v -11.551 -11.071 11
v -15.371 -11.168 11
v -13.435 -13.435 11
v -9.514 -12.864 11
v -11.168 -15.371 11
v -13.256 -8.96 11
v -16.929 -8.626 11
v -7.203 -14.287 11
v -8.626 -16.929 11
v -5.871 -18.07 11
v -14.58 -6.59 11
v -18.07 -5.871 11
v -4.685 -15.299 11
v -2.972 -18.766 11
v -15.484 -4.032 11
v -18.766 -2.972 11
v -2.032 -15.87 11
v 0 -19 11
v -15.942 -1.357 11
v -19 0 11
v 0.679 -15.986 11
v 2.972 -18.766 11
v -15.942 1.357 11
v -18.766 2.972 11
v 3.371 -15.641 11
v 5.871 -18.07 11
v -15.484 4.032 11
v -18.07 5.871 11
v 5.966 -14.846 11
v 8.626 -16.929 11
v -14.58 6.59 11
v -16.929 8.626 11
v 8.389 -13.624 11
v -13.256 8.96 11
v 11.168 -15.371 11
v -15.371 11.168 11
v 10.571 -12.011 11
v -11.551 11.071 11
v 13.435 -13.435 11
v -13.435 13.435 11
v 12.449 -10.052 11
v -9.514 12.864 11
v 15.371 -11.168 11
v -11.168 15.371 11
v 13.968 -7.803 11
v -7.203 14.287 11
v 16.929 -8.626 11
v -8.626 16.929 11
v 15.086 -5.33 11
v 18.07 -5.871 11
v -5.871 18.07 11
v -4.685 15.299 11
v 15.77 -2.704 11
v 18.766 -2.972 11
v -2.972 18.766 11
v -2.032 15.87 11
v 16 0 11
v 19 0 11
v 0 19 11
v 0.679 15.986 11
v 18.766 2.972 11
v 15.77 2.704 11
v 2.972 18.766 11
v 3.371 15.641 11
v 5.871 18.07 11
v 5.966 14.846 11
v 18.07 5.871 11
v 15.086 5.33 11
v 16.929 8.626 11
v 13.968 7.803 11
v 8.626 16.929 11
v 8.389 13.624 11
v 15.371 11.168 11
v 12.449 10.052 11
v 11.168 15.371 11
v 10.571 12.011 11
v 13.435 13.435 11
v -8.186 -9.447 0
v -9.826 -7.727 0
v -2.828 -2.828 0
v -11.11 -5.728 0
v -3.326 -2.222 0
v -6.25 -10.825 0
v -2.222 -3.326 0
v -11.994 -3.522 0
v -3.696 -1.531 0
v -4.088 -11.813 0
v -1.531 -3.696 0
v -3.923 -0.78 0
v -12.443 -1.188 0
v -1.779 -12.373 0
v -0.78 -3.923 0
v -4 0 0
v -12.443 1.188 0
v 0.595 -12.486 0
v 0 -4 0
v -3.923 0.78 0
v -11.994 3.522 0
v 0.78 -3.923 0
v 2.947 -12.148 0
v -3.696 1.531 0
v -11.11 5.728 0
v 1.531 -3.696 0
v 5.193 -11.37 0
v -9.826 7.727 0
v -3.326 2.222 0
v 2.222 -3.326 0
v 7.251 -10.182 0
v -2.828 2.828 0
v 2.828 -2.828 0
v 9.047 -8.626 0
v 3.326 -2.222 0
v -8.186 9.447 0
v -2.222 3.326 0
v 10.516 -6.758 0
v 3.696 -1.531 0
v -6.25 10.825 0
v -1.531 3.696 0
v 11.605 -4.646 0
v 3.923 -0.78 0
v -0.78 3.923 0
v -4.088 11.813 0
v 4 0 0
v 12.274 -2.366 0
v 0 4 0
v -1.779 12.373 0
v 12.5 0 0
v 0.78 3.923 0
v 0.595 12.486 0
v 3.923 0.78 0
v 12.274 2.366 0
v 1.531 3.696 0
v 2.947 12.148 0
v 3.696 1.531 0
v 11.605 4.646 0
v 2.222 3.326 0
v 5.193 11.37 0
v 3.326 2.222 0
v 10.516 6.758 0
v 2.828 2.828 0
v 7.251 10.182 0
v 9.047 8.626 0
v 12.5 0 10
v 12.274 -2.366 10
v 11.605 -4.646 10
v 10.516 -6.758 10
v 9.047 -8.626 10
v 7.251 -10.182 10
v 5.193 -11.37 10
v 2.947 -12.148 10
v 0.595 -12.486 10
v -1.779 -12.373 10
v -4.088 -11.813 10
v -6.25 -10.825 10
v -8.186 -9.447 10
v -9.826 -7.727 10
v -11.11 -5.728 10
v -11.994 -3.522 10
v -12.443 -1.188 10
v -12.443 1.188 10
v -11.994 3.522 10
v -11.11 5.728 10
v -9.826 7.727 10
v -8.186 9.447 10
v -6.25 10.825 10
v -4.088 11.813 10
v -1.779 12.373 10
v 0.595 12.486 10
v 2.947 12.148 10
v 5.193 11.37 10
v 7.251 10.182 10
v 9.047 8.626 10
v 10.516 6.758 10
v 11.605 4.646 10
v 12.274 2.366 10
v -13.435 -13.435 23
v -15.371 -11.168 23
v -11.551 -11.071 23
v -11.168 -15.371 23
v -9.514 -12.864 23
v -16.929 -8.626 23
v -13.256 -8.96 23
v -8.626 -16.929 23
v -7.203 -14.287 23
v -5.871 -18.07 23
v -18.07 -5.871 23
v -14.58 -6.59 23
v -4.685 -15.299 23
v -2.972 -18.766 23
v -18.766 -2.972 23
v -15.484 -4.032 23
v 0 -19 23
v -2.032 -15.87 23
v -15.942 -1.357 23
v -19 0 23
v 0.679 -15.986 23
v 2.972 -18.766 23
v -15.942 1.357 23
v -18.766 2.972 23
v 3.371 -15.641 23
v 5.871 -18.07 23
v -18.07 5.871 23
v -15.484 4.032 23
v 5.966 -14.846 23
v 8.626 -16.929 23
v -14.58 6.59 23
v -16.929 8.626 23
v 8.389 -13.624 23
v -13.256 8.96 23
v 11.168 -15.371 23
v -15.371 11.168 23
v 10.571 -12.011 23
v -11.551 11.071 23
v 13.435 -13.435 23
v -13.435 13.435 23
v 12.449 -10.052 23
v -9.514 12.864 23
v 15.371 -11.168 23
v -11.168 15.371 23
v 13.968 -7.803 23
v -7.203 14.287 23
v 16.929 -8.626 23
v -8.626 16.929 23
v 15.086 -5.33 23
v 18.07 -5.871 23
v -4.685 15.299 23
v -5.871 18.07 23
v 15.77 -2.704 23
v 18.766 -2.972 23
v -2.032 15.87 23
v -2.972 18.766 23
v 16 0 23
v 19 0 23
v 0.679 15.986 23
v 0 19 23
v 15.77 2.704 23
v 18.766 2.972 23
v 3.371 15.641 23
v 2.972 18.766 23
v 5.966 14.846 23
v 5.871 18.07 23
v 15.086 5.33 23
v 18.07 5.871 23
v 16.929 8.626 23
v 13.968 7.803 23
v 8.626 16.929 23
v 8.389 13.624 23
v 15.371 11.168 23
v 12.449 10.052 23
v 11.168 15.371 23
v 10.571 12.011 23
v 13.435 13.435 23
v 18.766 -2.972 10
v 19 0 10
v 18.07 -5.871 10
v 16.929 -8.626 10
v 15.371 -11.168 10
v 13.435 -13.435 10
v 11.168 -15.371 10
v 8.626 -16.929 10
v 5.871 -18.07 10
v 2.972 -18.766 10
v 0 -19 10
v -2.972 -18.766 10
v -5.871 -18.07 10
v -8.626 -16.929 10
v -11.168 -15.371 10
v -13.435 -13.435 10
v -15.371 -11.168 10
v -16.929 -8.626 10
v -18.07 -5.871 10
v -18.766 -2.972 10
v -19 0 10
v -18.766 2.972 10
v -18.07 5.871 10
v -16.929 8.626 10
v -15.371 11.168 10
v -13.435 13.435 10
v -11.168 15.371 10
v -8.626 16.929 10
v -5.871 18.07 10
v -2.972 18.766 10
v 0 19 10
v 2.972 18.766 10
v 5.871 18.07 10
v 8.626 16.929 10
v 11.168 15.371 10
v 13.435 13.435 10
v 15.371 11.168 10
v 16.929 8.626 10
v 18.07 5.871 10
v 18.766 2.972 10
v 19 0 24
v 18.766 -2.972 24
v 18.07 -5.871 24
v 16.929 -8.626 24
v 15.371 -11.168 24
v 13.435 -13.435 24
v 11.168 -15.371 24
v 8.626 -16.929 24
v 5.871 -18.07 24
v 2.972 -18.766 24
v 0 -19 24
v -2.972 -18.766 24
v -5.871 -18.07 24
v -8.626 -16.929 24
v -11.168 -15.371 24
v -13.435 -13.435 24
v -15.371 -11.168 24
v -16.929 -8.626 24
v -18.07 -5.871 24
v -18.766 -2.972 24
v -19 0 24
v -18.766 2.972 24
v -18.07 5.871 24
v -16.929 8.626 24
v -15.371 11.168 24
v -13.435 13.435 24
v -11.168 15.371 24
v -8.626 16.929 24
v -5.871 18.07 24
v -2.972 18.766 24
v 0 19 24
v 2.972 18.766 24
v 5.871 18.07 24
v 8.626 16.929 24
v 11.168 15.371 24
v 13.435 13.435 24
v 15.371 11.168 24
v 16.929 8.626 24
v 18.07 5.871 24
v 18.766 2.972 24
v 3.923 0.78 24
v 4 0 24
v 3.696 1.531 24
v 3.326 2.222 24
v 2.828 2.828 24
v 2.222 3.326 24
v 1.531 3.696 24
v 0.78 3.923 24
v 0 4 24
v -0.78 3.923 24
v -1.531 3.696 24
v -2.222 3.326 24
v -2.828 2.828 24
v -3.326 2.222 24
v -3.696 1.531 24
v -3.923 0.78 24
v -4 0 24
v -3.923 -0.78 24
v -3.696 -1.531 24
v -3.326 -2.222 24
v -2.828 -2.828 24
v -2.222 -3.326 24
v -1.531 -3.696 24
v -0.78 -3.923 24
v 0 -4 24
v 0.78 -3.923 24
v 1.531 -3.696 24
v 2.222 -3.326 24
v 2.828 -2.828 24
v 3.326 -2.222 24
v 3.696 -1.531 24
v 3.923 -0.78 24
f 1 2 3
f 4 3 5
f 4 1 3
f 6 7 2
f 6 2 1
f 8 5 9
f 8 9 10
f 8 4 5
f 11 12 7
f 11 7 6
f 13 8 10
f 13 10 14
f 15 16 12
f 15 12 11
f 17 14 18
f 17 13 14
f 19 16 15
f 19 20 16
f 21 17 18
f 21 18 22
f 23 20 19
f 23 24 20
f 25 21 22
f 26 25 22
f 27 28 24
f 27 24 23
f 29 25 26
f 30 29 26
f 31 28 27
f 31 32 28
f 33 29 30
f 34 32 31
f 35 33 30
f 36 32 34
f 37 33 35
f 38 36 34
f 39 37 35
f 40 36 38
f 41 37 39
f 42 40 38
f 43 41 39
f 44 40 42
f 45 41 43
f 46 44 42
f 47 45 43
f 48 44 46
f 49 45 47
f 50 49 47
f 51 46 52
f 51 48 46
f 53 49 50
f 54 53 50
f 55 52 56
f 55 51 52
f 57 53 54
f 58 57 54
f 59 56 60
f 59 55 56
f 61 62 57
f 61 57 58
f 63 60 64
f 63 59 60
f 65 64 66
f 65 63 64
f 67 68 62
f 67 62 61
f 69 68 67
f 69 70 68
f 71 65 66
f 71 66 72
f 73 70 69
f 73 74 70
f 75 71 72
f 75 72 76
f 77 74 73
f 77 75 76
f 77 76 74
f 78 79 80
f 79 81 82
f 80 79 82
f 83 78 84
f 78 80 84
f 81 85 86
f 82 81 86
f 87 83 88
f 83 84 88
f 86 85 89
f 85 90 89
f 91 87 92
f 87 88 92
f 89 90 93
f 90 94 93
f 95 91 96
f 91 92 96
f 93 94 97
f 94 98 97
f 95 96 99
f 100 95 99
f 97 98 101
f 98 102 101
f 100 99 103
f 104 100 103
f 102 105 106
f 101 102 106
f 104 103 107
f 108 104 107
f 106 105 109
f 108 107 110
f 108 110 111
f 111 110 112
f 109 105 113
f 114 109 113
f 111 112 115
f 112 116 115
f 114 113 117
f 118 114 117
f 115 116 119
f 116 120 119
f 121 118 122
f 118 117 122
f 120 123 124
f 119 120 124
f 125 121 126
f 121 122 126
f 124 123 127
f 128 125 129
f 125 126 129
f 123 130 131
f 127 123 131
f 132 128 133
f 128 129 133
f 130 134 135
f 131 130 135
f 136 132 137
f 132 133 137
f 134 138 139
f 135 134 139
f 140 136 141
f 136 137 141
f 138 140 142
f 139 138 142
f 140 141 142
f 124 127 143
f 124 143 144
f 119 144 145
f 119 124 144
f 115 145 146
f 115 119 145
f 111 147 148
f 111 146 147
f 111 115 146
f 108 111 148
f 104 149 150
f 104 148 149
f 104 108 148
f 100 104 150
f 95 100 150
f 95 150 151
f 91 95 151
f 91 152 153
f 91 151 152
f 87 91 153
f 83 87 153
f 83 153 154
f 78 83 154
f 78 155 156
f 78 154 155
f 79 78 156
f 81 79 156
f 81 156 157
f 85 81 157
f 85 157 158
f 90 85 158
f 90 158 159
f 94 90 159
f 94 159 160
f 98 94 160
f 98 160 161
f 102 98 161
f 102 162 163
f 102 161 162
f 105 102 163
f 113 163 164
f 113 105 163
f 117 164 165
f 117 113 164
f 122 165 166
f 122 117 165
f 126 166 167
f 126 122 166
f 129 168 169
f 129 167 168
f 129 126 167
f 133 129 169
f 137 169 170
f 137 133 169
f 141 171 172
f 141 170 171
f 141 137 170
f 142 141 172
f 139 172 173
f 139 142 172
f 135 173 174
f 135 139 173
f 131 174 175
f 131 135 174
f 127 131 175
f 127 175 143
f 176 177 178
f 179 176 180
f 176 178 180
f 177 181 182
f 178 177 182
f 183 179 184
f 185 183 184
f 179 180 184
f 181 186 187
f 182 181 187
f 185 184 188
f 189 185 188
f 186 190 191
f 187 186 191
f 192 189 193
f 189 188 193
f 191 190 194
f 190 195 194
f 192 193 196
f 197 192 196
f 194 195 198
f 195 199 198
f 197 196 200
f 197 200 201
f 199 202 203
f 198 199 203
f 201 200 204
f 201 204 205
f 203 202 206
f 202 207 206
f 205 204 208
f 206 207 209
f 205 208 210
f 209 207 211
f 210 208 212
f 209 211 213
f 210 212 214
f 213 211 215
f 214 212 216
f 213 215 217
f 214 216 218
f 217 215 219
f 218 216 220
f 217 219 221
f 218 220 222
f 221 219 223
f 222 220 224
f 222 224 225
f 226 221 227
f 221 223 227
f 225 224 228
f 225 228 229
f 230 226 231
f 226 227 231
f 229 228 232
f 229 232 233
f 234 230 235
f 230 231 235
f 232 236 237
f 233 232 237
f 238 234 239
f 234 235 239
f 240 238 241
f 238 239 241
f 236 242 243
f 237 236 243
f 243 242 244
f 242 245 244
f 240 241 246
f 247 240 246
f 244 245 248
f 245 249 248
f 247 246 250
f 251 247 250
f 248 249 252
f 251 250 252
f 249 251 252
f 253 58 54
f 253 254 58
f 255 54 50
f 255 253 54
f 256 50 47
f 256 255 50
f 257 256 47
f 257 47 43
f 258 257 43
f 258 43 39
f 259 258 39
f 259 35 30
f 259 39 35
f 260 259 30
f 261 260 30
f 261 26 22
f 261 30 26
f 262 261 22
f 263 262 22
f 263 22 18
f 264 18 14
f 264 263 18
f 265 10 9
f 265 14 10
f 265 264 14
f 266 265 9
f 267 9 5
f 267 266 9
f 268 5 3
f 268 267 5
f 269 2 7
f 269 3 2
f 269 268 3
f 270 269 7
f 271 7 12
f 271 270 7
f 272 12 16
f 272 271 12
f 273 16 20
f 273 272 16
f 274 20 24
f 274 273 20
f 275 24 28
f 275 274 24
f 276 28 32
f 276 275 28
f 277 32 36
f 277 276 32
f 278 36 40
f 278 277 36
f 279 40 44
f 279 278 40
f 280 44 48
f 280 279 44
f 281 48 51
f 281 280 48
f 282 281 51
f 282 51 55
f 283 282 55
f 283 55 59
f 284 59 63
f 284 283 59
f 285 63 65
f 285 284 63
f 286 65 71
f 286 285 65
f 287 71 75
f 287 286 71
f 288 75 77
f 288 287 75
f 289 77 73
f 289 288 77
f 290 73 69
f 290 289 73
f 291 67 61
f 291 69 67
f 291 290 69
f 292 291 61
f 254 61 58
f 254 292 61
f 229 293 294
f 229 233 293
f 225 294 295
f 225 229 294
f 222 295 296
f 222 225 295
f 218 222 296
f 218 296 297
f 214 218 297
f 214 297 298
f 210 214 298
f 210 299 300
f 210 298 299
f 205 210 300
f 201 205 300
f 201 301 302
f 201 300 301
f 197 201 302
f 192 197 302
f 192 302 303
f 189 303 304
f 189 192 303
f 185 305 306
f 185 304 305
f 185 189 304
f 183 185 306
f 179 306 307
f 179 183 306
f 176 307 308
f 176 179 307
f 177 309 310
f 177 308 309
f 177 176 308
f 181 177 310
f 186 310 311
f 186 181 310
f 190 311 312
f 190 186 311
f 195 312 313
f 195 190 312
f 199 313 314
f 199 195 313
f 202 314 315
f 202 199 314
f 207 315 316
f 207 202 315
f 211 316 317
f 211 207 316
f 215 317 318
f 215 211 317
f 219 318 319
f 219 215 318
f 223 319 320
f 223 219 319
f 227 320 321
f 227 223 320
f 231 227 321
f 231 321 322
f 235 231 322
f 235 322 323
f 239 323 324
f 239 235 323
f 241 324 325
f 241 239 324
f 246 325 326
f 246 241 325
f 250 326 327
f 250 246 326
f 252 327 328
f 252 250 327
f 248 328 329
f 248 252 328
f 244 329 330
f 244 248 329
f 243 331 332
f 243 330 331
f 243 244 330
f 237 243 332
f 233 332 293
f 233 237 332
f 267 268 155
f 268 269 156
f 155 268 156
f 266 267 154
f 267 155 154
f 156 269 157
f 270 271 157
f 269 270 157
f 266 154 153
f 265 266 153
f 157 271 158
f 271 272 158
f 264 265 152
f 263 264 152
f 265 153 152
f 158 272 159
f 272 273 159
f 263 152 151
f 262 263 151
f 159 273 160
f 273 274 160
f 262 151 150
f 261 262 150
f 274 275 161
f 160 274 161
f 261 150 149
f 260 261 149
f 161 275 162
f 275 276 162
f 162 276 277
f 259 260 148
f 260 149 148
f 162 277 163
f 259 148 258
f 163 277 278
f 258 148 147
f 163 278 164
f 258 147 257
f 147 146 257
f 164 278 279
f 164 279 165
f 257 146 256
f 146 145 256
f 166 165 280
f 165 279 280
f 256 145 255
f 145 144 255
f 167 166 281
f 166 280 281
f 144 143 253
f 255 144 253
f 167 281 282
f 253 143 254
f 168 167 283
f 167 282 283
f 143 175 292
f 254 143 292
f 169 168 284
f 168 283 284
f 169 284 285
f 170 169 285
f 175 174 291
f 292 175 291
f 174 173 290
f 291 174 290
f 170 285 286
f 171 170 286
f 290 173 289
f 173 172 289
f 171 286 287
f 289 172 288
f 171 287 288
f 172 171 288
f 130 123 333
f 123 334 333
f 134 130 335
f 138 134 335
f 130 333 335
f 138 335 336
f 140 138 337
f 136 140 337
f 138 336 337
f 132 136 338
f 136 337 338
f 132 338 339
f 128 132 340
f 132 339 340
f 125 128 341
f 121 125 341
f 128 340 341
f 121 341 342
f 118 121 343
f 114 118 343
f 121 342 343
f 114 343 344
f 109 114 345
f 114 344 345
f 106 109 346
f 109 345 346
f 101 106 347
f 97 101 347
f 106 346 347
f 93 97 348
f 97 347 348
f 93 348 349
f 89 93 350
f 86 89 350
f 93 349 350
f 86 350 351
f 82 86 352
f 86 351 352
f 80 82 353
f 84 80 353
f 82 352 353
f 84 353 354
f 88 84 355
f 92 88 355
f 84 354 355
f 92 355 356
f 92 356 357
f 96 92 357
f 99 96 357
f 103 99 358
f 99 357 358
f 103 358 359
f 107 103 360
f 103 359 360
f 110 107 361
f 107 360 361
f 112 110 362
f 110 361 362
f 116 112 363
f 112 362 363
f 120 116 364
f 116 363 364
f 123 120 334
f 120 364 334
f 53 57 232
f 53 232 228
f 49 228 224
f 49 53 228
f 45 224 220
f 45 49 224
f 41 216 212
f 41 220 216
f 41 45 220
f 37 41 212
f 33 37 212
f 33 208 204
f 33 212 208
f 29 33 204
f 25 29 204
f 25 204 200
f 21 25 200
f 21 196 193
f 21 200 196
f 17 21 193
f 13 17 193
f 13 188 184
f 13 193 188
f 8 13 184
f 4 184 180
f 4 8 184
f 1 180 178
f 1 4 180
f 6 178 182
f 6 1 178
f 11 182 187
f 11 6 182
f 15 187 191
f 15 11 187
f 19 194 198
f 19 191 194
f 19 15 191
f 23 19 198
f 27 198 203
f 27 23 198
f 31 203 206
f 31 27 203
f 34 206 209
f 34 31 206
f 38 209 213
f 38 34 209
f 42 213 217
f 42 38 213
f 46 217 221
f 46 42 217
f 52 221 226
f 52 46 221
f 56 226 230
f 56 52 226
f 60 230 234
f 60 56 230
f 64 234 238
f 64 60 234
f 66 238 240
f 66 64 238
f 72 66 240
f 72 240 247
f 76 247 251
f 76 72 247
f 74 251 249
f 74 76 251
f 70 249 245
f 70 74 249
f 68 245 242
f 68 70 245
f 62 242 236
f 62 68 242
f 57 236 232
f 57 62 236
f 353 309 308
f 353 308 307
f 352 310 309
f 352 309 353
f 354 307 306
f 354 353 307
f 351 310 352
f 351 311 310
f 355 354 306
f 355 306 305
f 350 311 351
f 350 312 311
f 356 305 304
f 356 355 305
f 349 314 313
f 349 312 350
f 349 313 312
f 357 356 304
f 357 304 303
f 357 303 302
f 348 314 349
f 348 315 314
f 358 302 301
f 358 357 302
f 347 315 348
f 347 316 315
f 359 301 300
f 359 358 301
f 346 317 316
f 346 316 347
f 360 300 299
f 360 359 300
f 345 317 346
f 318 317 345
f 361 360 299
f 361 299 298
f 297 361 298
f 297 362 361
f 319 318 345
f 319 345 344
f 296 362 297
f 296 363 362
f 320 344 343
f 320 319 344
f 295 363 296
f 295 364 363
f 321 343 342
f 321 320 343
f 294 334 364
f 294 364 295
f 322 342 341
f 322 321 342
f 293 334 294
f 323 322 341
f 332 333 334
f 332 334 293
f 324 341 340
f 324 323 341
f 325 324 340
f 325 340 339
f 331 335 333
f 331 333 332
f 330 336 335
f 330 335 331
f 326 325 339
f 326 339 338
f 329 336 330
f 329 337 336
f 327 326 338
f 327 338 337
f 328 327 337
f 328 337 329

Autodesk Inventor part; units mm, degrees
ref_plane "YZ Plane" through (0, 0, 0) normal (1, 0, 0) x (0, 1, 0)
ref_plane "XZ Plane" through (0, 0, 0) normal (0, 1, 0) x (-1, 0, 0)
ref_plane "XY Plane" through (0, 0, 0) normal (0, 0, 1) x (1, 0, 0)
sketch "Sketch1" plane through (0, 0, 0) normal (0, 0, 1) x (1, 0, 0)
  circle A0 centre (0, 0) radius 12.5
  dimension "d0" = 25
extrude "Extrusion1" add sketch "Sketch1" along normal blind 10
sketch "Sketch2" plane through (0, 0, 10) normal (0, 0, 1) x (1, 0, 0)
  circle A0 centre (0, 0) radius 19
  dimension "d3" = 38
extrude "Extrusion2" add sketch "Sketch2" along normal blind 1
sketch "Sketch3" plane through (0, 0, 11) normal (0, 0, 1) x (1, 0, 0)
  circle A0 centre (0, 0) radius 16
  dimension "d6" = 32
extrude "Extrusion3" add sketch "Sketch3" along normal blind 12
sketch "Sketch4" plane through (0, 0, 23) normal (0, 0, 1) x (1, 0, 0)
  circle A0 centre (0, 0) radius 19
  dimension "d9" = 38
extrude "Extrusion4" add sketch "Sketch4" along normal blind 1
sketch "Sketch5" plane through (0, 0, 24) normal (0, 0, 1) x (1, 0, 0)
  circle A0 centre (0, 0) radius 4
  dimension "d12" = 8
extrude "Extrusion5" cut sketch "Sketch5" against normal through all
properties part number "Pulley"
